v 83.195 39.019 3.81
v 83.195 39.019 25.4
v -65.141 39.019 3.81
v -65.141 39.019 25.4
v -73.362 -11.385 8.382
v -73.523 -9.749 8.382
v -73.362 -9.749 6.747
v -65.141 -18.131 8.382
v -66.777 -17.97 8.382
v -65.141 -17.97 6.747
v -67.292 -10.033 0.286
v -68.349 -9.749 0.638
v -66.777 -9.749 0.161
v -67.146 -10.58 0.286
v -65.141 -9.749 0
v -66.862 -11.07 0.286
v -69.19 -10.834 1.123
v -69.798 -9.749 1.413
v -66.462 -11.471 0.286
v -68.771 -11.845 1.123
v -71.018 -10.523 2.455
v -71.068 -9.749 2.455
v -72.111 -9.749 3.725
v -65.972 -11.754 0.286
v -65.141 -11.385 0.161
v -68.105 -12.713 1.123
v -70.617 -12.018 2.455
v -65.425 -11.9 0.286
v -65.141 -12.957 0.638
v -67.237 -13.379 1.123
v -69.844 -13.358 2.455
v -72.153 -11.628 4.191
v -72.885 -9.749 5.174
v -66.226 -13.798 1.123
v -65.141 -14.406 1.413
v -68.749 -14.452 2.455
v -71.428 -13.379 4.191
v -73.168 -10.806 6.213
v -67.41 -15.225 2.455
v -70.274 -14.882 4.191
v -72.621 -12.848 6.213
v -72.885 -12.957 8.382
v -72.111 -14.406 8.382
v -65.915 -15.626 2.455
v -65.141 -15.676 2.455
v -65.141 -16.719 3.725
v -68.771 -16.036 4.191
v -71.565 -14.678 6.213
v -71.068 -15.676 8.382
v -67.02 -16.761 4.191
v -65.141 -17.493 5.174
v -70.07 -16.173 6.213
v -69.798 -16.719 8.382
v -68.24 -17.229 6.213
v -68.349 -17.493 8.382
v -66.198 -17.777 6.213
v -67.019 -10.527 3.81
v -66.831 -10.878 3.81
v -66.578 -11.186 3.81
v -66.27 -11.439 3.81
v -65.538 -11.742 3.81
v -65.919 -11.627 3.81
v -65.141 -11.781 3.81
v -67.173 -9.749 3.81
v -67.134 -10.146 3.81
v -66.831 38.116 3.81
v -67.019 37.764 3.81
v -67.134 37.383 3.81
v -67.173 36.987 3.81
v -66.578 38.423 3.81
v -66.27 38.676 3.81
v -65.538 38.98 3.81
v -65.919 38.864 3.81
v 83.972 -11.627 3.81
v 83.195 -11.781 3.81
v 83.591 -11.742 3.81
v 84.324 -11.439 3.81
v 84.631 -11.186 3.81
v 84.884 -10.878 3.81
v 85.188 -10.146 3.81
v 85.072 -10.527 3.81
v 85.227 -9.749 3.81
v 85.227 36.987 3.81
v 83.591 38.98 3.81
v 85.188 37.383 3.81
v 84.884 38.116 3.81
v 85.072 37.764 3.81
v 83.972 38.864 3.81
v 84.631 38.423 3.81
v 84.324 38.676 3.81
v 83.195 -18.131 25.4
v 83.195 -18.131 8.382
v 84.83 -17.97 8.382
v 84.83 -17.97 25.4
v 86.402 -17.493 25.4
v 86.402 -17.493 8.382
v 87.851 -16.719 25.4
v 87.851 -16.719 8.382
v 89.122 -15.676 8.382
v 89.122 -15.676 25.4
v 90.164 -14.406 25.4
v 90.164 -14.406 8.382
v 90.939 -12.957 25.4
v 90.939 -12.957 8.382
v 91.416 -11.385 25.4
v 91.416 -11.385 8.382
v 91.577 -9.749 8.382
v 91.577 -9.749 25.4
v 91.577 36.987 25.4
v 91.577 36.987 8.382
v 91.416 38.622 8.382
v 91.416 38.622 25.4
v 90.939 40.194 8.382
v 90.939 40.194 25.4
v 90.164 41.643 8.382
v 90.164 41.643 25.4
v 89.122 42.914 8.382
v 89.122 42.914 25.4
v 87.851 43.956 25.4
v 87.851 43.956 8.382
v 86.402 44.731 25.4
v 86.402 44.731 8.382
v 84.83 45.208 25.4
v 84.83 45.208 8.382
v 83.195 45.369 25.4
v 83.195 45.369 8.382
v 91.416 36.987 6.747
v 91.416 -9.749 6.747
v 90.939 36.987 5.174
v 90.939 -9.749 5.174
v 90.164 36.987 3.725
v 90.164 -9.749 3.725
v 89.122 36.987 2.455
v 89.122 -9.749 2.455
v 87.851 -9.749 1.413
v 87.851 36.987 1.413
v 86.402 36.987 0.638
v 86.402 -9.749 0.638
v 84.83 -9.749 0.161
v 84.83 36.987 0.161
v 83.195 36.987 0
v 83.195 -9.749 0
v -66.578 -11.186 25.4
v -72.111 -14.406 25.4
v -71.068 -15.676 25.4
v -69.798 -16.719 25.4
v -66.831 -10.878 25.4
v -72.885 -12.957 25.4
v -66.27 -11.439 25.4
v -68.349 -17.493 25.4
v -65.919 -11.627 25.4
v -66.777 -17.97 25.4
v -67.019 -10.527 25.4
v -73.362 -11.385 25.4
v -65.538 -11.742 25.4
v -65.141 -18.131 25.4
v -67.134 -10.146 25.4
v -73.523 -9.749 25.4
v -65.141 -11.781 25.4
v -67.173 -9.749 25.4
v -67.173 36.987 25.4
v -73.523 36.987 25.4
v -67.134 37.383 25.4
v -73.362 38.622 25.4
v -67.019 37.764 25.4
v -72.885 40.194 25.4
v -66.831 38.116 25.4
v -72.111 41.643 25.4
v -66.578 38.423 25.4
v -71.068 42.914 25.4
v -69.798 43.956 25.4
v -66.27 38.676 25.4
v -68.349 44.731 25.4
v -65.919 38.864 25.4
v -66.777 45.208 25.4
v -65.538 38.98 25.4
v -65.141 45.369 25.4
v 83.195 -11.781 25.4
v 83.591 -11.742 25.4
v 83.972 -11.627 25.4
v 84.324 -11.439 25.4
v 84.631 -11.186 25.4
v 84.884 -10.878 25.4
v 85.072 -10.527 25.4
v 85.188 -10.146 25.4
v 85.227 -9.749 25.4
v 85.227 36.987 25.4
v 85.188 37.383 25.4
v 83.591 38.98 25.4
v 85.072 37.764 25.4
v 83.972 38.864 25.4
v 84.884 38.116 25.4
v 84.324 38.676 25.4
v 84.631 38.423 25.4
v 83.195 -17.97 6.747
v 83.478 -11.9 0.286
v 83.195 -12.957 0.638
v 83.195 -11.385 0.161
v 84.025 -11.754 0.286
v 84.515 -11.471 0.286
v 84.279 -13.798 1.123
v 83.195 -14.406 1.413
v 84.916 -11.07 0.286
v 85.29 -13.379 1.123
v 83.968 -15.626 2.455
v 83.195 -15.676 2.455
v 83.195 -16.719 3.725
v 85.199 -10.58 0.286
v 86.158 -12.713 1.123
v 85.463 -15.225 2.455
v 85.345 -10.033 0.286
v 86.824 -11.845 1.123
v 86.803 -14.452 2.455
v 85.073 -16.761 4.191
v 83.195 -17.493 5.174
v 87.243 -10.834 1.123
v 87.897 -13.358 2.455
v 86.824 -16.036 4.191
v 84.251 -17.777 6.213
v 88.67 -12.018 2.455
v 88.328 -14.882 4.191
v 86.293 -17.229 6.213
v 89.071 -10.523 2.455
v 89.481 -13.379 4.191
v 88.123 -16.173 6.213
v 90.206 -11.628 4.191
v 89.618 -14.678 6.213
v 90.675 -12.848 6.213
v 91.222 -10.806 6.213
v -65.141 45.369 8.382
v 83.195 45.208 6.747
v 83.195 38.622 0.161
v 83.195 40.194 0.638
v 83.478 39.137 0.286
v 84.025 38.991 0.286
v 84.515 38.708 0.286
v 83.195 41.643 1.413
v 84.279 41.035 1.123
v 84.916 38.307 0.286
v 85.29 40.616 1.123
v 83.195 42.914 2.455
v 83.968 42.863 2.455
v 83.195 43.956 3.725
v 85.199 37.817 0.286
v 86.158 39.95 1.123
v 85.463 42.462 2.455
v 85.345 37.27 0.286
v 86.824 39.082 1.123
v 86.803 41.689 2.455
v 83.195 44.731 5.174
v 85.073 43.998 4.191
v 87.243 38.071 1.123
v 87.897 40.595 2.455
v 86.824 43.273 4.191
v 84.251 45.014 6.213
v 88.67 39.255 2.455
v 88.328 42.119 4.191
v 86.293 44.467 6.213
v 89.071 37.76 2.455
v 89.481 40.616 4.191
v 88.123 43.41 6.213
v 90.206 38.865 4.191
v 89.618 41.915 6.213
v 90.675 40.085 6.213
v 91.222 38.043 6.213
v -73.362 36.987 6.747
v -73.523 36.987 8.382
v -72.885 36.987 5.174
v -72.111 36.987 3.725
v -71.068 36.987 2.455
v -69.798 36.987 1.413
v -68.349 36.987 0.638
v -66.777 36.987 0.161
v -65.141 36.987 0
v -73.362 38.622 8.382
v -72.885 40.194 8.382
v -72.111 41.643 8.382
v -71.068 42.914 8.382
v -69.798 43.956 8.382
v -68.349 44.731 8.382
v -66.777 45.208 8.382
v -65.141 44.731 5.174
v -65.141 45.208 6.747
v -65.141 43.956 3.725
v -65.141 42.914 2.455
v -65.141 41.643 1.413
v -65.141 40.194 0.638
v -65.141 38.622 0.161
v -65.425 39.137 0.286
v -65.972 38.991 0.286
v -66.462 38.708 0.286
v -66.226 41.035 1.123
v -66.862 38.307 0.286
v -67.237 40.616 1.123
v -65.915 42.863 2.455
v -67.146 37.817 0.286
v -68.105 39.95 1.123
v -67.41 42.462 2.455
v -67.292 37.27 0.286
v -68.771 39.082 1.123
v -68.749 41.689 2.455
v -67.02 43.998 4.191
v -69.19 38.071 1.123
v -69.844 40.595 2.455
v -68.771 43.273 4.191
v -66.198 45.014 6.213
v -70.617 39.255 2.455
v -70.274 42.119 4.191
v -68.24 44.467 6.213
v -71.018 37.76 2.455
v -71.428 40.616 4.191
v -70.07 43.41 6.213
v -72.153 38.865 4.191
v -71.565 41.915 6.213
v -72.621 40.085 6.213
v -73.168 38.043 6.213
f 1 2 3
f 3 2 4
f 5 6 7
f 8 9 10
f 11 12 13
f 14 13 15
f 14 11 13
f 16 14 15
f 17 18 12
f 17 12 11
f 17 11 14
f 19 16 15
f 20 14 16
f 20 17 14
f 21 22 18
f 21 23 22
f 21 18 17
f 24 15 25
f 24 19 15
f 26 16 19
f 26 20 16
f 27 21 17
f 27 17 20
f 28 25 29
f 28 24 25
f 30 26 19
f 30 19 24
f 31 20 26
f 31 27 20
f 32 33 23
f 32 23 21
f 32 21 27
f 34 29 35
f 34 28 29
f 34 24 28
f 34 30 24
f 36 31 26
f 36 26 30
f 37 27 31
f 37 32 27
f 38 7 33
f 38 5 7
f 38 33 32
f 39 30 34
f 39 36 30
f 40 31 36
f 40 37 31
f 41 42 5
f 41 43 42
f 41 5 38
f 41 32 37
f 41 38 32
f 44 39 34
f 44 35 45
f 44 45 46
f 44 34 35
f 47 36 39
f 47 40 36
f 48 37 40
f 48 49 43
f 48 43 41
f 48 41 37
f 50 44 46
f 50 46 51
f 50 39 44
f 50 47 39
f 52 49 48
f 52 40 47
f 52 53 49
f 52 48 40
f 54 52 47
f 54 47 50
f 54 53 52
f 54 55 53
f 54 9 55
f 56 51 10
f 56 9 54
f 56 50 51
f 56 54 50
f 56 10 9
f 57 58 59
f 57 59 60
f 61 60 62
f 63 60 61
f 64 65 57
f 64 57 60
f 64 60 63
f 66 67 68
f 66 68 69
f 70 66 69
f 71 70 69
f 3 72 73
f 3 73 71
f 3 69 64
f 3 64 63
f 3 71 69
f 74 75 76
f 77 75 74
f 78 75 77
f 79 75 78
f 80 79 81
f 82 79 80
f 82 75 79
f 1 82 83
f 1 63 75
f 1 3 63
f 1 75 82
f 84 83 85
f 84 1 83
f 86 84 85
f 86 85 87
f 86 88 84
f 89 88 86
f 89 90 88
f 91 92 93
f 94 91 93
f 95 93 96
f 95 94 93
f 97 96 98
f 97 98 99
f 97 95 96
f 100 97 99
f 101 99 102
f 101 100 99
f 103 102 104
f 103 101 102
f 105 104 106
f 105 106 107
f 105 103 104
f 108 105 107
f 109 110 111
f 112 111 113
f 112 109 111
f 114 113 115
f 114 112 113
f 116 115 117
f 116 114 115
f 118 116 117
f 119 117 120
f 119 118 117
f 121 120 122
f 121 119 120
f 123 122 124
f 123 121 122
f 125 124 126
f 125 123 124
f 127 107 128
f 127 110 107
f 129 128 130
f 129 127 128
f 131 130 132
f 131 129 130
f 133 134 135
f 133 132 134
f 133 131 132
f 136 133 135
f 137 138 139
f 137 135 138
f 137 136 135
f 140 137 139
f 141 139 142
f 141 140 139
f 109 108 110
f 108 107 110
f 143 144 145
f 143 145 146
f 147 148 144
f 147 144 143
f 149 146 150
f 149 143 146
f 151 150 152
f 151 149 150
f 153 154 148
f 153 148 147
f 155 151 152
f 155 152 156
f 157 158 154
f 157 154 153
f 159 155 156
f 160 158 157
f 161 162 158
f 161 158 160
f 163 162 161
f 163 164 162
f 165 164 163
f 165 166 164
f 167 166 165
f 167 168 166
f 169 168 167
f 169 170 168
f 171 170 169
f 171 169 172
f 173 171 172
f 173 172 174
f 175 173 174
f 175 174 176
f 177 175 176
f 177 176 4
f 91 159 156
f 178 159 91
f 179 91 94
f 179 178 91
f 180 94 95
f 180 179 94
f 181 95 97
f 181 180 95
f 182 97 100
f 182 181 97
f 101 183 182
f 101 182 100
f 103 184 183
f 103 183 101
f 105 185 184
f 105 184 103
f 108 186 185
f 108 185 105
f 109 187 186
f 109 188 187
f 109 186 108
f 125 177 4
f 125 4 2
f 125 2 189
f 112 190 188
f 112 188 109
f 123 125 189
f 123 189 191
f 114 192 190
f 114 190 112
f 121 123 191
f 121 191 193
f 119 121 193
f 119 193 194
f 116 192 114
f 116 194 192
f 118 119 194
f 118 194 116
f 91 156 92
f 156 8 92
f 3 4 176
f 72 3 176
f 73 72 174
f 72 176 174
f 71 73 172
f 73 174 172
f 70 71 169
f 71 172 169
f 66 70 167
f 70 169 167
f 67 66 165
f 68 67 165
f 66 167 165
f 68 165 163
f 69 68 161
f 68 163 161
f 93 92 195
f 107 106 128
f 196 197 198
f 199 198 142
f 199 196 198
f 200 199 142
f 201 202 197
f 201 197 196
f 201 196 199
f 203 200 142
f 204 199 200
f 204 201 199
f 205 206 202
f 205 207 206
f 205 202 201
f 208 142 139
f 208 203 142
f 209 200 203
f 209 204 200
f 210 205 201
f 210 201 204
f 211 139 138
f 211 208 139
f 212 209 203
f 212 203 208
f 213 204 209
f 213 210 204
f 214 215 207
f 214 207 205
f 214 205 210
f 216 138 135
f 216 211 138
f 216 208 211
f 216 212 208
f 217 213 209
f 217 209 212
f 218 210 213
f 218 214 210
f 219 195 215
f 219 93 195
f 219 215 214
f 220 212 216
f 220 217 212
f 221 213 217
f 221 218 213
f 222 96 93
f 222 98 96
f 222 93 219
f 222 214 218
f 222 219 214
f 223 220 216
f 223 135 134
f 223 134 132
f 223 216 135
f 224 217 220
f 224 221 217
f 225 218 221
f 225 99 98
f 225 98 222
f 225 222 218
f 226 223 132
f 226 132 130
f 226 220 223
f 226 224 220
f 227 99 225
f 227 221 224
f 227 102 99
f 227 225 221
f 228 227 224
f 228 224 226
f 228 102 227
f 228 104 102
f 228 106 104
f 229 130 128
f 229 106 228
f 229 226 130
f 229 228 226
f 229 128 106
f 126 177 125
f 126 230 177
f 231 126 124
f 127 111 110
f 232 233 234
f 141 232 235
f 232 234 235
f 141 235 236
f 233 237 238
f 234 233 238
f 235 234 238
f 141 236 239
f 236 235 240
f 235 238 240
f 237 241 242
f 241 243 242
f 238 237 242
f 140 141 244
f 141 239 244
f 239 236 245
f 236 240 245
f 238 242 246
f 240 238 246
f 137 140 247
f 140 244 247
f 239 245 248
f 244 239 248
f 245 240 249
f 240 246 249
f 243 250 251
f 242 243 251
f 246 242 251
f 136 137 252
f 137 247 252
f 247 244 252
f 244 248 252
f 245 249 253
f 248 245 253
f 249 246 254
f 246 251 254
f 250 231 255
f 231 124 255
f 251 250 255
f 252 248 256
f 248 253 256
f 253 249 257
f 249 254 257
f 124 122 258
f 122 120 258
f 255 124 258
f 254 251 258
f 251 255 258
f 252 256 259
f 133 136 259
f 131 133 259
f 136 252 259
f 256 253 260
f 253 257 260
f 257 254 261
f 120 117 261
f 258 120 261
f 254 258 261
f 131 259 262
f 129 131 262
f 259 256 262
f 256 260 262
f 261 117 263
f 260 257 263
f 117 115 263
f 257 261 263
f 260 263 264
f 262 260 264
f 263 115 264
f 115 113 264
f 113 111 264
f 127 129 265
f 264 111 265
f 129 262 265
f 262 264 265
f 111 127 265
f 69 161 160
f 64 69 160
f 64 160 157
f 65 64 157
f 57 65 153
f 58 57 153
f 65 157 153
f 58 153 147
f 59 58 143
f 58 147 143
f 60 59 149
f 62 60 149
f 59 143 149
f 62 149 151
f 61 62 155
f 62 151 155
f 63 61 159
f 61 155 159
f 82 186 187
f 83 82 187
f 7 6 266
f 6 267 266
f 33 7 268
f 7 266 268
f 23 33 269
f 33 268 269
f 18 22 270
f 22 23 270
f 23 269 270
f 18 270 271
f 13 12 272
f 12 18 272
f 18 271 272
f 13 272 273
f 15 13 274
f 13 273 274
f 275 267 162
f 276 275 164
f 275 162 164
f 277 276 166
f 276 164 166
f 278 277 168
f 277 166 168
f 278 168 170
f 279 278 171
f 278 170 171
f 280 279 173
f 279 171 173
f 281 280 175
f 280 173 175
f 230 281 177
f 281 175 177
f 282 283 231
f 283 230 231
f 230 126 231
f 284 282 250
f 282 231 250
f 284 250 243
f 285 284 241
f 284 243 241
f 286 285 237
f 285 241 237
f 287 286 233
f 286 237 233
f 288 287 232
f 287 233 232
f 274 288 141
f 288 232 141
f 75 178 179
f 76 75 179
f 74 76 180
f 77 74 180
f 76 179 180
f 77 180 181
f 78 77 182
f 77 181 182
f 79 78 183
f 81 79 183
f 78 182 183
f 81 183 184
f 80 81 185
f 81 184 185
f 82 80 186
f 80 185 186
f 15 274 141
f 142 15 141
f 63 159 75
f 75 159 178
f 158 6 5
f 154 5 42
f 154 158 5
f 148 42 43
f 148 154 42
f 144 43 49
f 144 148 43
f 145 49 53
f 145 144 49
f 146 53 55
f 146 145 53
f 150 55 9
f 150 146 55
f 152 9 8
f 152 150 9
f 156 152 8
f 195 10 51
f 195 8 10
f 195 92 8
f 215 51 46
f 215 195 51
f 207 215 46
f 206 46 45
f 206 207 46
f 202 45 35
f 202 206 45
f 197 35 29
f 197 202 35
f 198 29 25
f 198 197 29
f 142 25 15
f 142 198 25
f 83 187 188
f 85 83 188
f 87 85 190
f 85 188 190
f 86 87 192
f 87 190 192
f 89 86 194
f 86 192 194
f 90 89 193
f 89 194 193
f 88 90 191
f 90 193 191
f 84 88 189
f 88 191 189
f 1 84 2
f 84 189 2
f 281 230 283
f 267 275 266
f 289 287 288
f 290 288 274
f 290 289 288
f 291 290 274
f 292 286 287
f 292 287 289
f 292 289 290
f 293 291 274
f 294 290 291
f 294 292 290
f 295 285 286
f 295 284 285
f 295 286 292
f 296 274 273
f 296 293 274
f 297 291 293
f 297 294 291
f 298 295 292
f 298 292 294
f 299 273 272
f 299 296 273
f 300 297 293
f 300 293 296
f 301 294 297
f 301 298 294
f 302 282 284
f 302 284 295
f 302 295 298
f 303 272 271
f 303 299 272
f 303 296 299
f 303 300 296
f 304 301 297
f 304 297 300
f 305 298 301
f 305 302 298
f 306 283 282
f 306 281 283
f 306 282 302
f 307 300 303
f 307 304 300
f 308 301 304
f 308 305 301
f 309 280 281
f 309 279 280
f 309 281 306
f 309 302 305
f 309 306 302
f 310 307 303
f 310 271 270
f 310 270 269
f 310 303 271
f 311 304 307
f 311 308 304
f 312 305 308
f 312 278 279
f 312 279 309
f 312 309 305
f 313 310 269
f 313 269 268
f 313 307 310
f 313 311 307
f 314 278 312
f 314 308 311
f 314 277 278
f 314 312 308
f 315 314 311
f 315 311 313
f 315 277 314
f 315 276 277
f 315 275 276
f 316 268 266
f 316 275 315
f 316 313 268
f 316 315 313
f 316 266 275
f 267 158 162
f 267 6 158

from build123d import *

# Parameters (mm, degrees)
F0_W     = 165.1
F0_H     = 63.5
F1_DEPTH = 25.4
F2_R     = 8.382
F4_DEPTH = 21.59


with BuildPart() as f1:
    # F0 (on Top) → F1 (new body)
    with BuildSketch(Plane.XY):
        with Locations((9.026632, 13.618593)):
            Rectangle(F0_W, F0_H)
    extrude(amount=F1_DEPTH)

    # F2
    f2_edges = [f1.edges().sort_by_distance(p)[0] for p in [
        (91.576632, -18.131407, 12.7),
        (91.576632, 45.368593, 12.7),
        (-73.523368, 45.368593, 12.7),
        (-73.523368, -18.131407, 12.7),
        (9.026632, 45.368593, 0),
        (-73.523368, 13.618593, 0),
        (9.026632, -18.131407, 0),
        (91.576632, 13.618593, 0),
    ]]
    fillet(f2_edges, radius=F2_R)

    # F3 (on face) → F4 (cut)
    with BuildSketch(Plane.XY.offset(25.4)):
        with BuildLine():
            Line((85.226632, -9.749407), (85.226632, 36.986593))
            ThreePointArc((85.226632, 36.986593), (84.631473, 38.423434), (83.194632, 39.018593))
            Line((83.194632, 39.018593), (-65.141368, 39.018593))
            ThreePointArc((-65.141368, 39.018593), (-66.578209, 38.423434), (-67.173368, 36.986593))
            Line((-67.173368, 36.986593), (-67.173368, -9.749407))
            ThreePointArc((-67.173368, -9.749407), (-66.578209, -11.186248), (-65.141368, -11.781407))
            Line((-65.141368, -11.781407), (83.194632, -11.781407))
            ThreePointArc((83.194632, -11.781407), (84.631473, -11.186248), (85.226632, -9.749407))
        make_face()
    extrude(amount=-F4_DEPTH, mode=Mode.SUBTRACT)


solid = f1.part
